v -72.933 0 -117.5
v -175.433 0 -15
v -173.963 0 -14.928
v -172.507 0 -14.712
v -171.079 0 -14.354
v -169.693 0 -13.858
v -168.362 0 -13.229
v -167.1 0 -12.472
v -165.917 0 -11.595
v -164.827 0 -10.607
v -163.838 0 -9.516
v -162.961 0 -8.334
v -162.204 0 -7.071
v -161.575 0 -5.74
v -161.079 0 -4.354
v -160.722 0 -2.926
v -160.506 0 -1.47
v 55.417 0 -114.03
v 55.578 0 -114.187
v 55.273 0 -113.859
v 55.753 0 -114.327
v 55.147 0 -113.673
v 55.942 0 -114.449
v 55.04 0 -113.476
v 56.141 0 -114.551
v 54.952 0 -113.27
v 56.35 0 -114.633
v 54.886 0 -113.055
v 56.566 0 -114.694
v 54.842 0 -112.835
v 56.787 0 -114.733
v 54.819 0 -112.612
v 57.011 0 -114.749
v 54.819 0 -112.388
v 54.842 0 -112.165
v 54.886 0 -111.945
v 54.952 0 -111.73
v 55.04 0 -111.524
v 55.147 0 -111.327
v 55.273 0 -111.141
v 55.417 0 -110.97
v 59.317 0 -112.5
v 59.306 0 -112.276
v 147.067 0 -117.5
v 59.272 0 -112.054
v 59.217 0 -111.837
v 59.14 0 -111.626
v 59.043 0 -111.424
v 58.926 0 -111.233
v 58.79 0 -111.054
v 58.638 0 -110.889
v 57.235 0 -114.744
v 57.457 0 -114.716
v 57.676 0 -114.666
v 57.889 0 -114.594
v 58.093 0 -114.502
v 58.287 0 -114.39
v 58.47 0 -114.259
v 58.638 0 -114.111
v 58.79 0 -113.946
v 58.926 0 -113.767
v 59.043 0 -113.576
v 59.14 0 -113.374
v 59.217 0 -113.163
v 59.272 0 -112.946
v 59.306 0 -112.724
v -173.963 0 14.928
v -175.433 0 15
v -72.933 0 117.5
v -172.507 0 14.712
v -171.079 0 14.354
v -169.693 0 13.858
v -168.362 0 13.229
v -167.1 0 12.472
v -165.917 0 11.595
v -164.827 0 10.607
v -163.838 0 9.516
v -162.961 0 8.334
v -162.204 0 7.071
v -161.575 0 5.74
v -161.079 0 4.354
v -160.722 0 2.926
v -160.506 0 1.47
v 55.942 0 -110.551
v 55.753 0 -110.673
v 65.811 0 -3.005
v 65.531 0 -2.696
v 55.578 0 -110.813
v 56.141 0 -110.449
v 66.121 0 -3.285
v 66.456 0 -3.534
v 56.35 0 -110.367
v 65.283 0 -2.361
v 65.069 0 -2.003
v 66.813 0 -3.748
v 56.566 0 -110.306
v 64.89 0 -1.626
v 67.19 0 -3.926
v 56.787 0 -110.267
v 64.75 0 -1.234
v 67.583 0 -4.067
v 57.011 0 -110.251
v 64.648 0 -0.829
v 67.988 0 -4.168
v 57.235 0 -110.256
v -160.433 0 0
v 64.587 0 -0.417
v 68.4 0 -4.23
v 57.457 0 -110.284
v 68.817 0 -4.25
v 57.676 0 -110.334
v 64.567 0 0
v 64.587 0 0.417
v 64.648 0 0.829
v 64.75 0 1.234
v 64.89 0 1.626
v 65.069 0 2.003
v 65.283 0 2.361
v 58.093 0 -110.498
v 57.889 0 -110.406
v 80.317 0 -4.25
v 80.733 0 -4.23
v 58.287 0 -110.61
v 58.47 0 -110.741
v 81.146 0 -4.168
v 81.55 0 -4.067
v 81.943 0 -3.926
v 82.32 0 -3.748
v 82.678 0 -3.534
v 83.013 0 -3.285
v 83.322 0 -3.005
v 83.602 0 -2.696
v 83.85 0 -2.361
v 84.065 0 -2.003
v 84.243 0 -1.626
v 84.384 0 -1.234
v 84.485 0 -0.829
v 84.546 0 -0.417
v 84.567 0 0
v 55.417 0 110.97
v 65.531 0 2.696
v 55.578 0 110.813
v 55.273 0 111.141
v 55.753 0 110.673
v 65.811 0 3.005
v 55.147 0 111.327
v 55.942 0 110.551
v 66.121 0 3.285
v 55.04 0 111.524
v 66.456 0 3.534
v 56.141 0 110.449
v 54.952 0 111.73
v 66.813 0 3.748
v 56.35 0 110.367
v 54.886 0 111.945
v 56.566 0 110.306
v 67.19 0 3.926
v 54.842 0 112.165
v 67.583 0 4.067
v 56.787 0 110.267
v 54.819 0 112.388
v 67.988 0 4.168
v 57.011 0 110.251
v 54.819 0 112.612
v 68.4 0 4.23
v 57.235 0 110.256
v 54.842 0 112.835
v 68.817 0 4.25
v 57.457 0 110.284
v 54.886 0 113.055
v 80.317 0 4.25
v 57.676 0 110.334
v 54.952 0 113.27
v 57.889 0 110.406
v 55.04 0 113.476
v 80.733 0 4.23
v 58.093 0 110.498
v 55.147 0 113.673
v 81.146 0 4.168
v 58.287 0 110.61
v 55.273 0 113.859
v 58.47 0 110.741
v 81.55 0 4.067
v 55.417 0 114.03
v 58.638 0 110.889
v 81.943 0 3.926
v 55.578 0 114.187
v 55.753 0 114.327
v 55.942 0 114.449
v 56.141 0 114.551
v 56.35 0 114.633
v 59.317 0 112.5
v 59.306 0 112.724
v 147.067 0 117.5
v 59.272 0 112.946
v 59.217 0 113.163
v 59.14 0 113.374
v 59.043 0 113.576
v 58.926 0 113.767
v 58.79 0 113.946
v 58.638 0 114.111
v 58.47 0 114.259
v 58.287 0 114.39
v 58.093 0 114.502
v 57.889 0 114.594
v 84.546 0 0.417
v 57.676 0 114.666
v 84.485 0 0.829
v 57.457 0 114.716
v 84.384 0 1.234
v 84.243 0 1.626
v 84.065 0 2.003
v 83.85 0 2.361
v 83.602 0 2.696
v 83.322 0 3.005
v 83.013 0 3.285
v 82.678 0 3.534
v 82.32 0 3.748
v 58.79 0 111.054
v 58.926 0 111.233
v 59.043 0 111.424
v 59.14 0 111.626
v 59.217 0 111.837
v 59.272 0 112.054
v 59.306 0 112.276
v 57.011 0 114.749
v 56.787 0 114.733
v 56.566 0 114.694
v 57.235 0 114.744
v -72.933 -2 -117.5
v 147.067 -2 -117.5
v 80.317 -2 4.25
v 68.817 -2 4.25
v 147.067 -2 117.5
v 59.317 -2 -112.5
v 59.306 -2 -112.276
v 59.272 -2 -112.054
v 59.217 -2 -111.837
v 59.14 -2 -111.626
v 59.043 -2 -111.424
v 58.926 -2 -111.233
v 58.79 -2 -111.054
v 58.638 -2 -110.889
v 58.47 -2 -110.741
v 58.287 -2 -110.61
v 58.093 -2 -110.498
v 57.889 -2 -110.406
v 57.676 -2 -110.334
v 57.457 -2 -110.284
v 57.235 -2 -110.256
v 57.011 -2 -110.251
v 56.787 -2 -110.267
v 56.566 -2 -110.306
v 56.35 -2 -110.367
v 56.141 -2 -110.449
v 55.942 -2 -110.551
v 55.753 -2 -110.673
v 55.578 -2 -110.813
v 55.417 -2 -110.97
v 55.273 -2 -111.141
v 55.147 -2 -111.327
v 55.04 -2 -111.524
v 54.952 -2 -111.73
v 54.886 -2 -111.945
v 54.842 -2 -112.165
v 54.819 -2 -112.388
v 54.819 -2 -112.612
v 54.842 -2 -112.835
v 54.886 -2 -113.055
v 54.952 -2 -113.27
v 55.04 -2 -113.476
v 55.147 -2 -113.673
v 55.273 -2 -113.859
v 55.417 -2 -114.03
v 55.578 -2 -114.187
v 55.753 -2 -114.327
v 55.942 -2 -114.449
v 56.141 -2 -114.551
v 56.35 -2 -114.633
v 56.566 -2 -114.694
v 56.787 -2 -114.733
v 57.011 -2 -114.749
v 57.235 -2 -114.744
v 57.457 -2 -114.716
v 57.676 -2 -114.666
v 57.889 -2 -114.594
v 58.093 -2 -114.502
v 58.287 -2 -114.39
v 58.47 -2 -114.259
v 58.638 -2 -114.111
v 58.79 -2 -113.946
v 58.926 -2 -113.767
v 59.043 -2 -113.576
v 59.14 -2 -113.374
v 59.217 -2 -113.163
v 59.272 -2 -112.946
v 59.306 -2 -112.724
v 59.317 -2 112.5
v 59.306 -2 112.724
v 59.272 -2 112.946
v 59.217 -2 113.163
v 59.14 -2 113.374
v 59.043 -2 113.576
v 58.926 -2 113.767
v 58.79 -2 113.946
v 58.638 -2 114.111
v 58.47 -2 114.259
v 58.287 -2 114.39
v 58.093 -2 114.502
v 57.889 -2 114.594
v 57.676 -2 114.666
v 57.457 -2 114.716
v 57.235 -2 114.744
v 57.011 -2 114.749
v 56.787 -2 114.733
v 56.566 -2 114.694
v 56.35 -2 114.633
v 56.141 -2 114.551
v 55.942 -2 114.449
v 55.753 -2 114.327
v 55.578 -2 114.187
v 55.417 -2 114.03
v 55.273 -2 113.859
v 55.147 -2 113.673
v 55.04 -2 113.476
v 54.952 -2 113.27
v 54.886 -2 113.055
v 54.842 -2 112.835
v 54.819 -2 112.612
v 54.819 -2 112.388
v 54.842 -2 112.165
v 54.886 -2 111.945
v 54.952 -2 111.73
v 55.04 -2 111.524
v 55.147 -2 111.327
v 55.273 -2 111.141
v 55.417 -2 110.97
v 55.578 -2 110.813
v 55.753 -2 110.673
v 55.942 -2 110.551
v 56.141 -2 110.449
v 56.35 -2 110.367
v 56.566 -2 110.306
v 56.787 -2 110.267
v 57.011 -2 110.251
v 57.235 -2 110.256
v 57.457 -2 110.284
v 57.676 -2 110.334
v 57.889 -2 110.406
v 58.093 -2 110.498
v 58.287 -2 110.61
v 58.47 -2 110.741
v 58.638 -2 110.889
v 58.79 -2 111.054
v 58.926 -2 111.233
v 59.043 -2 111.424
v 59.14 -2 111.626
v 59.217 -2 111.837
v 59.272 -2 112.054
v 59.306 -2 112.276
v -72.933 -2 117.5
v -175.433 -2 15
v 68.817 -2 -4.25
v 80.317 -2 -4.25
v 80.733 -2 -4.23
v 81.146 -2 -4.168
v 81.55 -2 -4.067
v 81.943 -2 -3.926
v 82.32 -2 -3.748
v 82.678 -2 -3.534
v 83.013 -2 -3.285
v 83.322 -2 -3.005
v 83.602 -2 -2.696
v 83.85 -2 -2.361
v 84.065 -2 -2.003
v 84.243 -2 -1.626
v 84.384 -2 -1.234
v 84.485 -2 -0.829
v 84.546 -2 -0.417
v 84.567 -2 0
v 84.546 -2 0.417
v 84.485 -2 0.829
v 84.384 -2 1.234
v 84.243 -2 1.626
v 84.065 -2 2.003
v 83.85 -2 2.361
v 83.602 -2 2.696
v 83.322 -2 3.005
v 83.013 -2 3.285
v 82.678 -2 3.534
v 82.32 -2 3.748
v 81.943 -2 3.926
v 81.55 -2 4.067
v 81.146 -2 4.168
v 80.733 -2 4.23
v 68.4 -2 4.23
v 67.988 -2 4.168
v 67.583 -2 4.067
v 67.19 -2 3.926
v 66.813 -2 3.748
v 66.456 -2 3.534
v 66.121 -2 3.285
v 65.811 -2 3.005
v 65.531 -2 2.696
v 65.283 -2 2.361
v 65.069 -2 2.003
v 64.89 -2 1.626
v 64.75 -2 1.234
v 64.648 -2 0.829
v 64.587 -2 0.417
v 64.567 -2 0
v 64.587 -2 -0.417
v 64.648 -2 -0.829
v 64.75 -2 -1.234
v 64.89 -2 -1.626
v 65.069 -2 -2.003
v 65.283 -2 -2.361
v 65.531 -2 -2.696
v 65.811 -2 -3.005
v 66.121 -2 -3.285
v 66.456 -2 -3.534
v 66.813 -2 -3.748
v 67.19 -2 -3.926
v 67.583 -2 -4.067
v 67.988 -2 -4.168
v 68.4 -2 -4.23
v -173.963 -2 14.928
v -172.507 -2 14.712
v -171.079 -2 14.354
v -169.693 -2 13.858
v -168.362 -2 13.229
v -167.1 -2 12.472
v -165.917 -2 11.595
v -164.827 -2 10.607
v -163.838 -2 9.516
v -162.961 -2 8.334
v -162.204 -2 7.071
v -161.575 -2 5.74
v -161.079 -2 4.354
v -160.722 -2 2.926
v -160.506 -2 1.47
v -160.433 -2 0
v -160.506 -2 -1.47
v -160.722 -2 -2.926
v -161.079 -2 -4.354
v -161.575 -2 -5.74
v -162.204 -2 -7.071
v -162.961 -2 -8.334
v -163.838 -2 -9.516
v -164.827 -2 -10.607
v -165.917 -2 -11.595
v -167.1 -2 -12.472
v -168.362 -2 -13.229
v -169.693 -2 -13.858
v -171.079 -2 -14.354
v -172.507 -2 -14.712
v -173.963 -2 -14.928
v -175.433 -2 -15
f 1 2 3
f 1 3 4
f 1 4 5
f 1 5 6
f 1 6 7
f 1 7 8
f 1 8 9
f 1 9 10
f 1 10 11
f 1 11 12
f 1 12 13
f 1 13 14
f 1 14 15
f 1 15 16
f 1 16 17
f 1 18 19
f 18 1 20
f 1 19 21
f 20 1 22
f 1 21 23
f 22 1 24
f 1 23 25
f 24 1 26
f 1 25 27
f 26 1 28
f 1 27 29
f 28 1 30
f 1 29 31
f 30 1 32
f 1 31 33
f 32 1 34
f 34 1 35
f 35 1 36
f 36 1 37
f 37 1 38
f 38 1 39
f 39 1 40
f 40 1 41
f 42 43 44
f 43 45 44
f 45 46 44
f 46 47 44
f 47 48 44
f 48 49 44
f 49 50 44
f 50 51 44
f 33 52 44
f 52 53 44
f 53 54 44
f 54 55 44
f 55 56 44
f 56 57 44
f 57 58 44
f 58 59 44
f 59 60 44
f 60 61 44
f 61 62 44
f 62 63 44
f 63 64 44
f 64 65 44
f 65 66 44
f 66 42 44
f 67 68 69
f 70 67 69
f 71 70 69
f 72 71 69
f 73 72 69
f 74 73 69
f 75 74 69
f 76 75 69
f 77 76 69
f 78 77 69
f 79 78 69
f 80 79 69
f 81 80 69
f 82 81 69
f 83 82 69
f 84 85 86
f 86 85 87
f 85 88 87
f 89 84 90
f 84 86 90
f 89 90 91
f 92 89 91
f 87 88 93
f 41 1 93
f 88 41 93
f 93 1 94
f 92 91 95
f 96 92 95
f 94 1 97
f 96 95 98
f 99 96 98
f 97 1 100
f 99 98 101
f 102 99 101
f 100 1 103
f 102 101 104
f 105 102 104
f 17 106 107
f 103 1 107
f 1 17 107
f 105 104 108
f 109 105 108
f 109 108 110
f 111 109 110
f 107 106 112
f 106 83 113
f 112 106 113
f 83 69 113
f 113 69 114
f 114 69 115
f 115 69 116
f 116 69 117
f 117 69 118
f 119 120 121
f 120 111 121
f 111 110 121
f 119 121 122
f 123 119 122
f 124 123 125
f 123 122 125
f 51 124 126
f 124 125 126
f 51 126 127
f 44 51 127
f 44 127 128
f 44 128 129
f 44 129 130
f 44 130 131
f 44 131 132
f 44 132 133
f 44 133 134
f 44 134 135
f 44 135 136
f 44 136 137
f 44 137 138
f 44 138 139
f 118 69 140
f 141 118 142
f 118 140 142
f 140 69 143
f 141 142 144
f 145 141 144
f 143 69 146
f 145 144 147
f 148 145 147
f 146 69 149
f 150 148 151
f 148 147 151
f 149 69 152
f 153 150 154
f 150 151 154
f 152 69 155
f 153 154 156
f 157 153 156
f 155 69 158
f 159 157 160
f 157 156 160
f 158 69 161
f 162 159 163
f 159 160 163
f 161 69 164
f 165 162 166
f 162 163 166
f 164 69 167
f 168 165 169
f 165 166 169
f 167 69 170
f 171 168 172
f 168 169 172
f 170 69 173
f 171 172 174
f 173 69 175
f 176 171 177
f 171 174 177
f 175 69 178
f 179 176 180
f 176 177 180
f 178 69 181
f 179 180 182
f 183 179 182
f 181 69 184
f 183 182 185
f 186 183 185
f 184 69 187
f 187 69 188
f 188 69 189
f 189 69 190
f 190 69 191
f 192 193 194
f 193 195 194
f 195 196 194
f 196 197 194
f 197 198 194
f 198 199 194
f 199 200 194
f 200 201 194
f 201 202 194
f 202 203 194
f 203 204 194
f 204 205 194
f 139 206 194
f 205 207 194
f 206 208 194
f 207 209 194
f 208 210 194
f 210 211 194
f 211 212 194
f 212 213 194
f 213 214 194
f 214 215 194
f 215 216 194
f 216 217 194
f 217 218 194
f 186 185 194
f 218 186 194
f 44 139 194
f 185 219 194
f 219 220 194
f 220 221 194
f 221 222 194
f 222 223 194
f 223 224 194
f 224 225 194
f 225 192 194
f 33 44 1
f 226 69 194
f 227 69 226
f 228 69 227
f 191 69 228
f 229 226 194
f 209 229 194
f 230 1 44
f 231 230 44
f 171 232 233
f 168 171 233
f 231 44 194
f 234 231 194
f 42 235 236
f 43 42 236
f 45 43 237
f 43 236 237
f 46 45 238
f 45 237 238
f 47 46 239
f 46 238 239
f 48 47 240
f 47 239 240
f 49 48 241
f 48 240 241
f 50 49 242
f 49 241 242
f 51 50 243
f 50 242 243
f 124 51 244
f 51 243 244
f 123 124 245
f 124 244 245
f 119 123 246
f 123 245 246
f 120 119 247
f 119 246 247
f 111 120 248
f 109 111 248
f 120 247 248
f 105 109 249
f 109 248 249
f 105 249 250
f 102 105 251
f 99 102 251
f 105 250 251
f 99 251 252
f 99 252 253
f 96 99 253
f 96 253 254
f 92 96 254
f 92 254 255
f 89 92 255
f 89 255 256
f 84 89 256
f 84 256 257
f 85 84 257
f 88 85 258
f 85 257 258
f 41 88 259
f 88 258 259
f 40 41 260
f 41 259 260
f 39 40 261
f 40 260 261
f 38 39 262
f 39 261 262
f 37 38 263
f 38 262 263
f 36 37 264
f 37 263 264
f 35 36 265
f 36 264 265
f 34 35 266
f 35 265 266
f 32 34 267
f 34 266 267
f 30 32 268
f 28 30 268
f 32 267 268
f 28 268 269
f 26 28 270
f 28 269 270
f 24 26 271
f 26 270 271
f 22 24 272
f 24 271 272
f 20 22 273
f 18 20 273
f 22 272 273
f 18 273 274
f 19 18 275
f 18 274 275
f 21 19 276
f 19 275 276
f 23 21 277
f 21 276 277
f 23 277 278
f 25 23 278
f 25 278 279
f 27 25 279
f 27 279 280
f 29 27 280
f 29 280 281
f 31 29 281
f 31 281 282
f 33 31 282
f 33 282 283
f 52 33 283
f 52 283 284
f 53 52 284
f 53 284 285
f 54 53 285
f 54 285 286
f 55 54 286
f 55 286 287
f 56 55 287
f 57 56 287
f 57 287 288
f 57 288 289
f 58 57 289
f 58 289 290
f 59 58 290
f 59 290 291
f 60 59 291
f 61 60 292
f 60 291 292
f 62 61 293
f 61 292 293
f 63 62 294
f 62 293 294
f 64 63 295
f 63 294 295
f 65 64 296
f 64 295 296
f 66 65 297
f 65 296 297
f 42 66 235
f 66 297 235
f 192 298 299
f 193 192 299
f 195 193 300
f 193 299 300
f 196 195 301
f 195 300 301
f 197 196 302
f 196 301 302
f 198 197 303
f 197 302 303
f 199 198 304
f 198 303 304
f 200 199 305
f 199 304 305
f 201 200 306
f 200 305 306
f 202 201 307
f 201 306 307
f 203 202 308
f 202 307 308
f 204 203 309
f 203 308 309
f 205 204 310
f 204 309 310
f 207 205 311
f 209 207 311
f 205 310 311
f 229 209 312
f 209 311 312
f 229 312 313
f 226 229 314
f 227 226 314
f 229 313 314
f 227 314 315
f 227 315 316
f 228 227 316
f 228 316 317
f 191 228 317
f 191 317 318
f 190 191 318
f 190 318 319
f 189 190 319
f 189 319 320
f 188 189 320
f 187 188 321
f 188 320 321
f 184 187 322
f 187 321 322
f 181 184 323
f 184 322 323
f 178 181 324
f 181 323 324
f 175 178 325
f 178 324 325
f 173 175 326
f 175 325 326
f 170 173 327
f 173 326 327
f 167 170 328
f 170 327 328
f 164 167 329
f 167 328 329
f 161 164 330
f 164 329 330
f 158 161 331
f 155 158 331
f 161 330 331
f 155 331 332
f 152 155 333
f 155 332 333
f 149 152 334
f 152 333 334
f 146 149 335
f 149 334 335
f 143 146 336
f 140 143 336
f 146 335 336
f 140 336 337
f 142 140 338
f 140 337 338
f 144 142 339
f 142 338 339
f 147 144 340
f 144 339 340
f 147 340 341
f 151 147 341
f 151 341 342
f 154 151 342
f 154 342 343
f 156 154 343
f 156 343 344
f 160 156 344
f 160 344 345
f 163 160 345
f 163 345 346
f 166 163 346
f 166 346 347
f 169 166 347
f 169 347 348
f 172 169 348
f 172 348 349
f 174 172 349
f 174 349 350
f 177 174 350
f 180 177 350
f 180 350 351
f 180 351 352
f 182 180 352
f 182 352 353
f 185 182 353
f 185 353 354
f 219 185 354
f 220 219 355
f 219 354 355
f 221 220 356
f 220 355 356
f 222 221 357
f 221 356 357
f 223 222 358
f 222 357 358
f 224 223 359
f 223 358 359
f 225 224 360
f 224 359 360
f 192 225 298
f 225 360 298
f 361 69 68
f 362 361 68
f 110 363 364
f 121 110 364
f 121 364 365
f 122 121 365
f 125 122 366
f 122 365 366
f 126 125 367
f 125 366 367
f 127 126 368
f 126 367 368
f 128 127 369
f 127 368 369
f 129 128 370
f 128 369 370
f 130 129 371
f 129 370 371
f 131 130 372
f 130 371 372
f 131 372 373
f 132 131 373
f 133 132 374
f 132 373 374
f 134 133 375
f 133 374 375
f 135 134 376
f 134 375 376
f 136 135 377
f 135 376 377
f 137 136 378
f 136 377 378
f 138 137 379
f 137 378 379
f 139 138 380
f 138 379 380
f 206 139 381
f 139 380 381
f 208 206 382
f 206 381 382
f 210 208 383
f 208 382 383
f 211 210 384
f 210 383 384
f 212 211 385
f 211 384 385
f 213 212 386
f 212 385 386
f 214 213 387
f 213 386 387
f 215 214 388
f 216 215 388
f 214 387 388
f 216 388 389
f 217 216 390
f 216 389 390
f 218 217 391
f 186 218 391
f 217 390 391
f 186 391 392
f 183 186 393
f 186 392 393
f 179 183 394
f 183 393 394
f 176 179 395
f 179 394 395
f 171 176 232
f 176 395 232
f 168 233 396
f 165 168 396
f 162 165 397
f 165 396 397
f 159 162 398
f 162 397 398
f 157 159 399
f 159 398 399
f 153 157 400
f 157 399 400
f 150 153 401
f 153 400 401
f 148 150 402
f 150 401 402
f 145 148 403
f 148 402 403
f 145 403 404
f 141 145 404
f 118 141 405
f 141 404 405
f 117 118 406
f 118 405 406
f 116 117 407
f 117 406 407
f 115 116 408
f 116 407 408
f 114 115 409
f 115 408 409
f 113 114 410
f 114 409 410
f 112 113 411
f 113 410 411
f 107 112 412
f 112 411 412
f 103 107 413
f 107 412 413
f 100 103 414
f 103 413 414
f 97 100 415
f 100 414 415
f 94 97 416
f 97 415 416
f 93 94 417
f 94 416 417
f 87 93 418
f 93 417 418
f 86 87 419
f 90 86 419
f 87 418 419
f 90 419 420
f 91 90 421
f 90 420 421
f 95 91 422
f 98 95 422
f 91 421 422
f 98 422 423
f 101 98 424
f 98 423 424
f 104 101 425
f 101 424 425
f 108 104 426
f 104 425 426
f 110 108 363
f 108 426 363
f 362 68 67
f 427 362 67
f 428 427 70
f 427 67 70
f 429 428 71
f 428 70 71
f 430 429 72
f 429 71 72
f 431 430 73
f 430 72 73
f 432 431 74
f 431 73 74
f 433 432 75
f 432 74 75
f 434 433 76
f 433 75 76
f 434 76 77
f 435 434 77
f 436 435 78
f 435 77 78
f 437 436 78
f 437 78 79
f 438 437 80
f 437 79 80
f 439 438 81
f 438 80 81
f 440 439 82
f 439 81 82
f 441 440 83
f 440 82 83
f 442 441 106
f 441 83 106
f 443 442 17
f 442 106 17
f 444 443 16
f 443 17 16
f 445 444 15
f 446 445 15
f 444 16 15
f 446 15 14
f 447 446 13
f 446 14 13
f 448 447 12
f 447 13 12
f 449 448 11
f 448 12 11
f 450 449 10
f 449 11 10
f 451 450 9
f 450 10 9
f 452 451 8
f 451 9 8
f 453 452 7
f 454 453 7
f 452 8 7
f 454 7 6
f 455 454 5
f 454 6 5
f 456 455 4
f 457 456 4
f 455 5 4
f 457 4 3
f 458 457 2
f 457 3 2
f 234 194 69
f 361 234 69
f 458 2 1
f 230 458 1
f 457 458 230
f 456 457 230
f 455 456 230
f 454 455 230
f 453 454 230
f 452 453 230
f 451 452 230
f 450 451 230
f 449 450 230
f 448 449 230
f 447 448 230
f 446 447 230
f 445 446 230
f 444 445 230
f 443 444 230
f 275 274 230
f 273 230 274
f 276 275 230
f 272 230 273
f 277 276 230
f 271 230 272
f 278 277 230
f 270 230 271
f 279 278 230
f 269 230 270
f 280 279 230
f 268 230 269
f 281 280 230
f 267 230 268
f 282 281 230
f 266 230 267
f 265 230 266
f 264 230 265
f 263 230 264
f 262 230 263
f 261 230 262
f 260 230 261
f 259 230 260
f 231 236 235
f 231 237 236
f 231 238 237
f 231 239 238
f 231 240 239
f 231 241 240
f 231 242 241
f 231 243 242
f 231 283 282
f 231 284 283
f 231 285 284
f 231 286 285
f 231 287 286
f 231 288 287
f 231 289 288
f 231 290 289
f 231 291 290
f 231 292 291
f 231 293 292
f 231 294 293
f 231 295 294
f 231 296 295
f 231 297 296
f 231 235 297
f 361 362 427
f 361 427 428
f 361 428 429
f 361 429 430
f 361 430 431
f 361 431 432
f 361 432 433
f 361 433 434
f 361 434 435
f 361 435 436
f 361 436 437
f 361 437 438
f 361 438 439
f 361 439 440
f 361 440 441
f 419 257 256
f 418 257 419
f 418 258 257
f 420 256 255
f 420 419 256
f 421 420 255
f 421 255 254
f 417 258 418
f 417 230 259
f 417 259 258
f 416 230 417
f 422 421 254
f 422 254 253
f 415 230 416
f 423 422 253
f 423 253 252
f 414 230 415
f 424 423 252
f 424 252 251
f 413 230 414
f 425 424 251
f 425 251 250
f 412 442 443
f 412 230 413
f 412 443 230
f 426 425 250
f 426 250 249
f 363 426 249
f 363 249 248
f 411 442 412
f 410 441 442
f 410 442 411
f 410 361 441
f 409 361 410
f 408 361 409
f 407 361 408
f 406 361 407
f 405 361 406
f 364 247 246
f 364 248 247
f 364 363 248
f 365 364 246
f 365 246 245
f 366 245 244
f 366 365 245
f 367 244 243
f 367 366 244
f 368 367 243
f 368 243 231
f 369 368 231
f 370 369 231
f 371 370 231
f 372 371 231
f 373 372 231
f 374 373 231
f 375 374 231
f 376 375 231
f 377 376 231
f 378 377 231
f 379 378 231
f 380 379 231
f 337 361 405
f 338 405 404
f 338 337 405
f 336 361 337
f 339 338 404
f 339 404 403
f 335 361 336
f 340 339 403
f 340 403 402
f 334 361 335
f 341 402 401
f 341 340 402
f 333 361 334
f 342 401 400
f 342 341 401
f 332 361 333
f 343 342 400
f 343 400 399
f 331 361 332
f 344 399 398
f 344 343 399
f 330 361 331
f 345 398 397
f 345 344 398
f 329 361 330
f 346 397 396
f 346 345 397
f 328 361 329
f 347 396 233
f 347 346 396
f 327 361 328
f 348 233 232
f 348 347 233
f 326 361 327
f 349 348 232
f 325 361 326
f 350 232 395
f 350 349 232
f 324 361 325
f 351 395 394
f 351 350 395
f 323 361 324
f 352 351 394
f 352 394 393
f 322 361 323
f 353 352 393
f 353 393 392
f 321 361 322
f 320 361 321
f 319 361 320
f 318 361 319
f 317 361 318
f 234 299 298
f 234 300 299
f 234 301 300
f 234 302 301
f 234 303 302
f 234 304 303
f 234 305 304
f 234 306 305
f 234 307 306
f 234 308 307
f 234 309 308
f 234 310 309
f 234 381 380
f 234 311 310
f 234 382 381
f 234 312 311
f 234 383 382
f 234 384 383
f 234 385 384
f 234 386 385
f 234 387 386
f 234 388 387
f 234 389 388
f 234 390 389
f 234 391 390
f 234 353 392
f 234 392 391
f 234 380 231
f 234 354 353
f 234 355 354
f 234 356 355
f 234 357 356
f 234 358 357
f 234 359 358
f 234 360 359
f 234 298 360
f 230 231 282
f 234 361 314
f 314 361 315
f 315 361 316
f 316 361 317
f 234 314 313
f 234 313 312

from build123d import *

# Parameters (mm, degrees)
F1_DEPTH = 2
F2_R     = 2.25
F3_DEPTH = 2


with BuildPart() as f1:
    # F0 (on Front) → F1 (new body)
    with BuildSketch(Plane.XZ):
        with BuildLine():
            Line((-72.933308, -117.5), (147.066692, -117.5))
            Line((147.066692, -117.5), (147.066692, 117.5))
            Line((147.066692, 117.5), (-72.933308, 117.5))
            Line((-72.933308, 117.5), (-175.433308, 15))
            ThreePointArc((-175.433308, 15), (-160.433308, 0), (-175.433308, -15))
            Line((-175.433308, -15), (-72.933308, -117.5))
        make_face()
    extrude(amount=F1_DEPTH)

    # F2 (on face) → F3 (cut, through all)
    with BuildSketch(Plane.XZ.offset(2)):
        with BuildLine():
            Line((68.816692, -4.25), (80.316692, -4.25))
            ThreePointArc((80.316692, -4.25), (84.566692, 0), (80.316692, 4.25))
            Line((80.316692, 4.25), (68.816692, 4.25))
            ThreePointArc((68.816692, 4.25), (64.566692, 0), (68.816692, -4.25))
        make_face()
        with Locations((57.066692, -112.5)):
            Circle(F2_R)
        with Locations((57.066692, 112.5)):
            Circle(F2_R)
    extrude(amount=-F3_DEPTH, mode=Mode.SUBTRACT)


solid = f1.part
